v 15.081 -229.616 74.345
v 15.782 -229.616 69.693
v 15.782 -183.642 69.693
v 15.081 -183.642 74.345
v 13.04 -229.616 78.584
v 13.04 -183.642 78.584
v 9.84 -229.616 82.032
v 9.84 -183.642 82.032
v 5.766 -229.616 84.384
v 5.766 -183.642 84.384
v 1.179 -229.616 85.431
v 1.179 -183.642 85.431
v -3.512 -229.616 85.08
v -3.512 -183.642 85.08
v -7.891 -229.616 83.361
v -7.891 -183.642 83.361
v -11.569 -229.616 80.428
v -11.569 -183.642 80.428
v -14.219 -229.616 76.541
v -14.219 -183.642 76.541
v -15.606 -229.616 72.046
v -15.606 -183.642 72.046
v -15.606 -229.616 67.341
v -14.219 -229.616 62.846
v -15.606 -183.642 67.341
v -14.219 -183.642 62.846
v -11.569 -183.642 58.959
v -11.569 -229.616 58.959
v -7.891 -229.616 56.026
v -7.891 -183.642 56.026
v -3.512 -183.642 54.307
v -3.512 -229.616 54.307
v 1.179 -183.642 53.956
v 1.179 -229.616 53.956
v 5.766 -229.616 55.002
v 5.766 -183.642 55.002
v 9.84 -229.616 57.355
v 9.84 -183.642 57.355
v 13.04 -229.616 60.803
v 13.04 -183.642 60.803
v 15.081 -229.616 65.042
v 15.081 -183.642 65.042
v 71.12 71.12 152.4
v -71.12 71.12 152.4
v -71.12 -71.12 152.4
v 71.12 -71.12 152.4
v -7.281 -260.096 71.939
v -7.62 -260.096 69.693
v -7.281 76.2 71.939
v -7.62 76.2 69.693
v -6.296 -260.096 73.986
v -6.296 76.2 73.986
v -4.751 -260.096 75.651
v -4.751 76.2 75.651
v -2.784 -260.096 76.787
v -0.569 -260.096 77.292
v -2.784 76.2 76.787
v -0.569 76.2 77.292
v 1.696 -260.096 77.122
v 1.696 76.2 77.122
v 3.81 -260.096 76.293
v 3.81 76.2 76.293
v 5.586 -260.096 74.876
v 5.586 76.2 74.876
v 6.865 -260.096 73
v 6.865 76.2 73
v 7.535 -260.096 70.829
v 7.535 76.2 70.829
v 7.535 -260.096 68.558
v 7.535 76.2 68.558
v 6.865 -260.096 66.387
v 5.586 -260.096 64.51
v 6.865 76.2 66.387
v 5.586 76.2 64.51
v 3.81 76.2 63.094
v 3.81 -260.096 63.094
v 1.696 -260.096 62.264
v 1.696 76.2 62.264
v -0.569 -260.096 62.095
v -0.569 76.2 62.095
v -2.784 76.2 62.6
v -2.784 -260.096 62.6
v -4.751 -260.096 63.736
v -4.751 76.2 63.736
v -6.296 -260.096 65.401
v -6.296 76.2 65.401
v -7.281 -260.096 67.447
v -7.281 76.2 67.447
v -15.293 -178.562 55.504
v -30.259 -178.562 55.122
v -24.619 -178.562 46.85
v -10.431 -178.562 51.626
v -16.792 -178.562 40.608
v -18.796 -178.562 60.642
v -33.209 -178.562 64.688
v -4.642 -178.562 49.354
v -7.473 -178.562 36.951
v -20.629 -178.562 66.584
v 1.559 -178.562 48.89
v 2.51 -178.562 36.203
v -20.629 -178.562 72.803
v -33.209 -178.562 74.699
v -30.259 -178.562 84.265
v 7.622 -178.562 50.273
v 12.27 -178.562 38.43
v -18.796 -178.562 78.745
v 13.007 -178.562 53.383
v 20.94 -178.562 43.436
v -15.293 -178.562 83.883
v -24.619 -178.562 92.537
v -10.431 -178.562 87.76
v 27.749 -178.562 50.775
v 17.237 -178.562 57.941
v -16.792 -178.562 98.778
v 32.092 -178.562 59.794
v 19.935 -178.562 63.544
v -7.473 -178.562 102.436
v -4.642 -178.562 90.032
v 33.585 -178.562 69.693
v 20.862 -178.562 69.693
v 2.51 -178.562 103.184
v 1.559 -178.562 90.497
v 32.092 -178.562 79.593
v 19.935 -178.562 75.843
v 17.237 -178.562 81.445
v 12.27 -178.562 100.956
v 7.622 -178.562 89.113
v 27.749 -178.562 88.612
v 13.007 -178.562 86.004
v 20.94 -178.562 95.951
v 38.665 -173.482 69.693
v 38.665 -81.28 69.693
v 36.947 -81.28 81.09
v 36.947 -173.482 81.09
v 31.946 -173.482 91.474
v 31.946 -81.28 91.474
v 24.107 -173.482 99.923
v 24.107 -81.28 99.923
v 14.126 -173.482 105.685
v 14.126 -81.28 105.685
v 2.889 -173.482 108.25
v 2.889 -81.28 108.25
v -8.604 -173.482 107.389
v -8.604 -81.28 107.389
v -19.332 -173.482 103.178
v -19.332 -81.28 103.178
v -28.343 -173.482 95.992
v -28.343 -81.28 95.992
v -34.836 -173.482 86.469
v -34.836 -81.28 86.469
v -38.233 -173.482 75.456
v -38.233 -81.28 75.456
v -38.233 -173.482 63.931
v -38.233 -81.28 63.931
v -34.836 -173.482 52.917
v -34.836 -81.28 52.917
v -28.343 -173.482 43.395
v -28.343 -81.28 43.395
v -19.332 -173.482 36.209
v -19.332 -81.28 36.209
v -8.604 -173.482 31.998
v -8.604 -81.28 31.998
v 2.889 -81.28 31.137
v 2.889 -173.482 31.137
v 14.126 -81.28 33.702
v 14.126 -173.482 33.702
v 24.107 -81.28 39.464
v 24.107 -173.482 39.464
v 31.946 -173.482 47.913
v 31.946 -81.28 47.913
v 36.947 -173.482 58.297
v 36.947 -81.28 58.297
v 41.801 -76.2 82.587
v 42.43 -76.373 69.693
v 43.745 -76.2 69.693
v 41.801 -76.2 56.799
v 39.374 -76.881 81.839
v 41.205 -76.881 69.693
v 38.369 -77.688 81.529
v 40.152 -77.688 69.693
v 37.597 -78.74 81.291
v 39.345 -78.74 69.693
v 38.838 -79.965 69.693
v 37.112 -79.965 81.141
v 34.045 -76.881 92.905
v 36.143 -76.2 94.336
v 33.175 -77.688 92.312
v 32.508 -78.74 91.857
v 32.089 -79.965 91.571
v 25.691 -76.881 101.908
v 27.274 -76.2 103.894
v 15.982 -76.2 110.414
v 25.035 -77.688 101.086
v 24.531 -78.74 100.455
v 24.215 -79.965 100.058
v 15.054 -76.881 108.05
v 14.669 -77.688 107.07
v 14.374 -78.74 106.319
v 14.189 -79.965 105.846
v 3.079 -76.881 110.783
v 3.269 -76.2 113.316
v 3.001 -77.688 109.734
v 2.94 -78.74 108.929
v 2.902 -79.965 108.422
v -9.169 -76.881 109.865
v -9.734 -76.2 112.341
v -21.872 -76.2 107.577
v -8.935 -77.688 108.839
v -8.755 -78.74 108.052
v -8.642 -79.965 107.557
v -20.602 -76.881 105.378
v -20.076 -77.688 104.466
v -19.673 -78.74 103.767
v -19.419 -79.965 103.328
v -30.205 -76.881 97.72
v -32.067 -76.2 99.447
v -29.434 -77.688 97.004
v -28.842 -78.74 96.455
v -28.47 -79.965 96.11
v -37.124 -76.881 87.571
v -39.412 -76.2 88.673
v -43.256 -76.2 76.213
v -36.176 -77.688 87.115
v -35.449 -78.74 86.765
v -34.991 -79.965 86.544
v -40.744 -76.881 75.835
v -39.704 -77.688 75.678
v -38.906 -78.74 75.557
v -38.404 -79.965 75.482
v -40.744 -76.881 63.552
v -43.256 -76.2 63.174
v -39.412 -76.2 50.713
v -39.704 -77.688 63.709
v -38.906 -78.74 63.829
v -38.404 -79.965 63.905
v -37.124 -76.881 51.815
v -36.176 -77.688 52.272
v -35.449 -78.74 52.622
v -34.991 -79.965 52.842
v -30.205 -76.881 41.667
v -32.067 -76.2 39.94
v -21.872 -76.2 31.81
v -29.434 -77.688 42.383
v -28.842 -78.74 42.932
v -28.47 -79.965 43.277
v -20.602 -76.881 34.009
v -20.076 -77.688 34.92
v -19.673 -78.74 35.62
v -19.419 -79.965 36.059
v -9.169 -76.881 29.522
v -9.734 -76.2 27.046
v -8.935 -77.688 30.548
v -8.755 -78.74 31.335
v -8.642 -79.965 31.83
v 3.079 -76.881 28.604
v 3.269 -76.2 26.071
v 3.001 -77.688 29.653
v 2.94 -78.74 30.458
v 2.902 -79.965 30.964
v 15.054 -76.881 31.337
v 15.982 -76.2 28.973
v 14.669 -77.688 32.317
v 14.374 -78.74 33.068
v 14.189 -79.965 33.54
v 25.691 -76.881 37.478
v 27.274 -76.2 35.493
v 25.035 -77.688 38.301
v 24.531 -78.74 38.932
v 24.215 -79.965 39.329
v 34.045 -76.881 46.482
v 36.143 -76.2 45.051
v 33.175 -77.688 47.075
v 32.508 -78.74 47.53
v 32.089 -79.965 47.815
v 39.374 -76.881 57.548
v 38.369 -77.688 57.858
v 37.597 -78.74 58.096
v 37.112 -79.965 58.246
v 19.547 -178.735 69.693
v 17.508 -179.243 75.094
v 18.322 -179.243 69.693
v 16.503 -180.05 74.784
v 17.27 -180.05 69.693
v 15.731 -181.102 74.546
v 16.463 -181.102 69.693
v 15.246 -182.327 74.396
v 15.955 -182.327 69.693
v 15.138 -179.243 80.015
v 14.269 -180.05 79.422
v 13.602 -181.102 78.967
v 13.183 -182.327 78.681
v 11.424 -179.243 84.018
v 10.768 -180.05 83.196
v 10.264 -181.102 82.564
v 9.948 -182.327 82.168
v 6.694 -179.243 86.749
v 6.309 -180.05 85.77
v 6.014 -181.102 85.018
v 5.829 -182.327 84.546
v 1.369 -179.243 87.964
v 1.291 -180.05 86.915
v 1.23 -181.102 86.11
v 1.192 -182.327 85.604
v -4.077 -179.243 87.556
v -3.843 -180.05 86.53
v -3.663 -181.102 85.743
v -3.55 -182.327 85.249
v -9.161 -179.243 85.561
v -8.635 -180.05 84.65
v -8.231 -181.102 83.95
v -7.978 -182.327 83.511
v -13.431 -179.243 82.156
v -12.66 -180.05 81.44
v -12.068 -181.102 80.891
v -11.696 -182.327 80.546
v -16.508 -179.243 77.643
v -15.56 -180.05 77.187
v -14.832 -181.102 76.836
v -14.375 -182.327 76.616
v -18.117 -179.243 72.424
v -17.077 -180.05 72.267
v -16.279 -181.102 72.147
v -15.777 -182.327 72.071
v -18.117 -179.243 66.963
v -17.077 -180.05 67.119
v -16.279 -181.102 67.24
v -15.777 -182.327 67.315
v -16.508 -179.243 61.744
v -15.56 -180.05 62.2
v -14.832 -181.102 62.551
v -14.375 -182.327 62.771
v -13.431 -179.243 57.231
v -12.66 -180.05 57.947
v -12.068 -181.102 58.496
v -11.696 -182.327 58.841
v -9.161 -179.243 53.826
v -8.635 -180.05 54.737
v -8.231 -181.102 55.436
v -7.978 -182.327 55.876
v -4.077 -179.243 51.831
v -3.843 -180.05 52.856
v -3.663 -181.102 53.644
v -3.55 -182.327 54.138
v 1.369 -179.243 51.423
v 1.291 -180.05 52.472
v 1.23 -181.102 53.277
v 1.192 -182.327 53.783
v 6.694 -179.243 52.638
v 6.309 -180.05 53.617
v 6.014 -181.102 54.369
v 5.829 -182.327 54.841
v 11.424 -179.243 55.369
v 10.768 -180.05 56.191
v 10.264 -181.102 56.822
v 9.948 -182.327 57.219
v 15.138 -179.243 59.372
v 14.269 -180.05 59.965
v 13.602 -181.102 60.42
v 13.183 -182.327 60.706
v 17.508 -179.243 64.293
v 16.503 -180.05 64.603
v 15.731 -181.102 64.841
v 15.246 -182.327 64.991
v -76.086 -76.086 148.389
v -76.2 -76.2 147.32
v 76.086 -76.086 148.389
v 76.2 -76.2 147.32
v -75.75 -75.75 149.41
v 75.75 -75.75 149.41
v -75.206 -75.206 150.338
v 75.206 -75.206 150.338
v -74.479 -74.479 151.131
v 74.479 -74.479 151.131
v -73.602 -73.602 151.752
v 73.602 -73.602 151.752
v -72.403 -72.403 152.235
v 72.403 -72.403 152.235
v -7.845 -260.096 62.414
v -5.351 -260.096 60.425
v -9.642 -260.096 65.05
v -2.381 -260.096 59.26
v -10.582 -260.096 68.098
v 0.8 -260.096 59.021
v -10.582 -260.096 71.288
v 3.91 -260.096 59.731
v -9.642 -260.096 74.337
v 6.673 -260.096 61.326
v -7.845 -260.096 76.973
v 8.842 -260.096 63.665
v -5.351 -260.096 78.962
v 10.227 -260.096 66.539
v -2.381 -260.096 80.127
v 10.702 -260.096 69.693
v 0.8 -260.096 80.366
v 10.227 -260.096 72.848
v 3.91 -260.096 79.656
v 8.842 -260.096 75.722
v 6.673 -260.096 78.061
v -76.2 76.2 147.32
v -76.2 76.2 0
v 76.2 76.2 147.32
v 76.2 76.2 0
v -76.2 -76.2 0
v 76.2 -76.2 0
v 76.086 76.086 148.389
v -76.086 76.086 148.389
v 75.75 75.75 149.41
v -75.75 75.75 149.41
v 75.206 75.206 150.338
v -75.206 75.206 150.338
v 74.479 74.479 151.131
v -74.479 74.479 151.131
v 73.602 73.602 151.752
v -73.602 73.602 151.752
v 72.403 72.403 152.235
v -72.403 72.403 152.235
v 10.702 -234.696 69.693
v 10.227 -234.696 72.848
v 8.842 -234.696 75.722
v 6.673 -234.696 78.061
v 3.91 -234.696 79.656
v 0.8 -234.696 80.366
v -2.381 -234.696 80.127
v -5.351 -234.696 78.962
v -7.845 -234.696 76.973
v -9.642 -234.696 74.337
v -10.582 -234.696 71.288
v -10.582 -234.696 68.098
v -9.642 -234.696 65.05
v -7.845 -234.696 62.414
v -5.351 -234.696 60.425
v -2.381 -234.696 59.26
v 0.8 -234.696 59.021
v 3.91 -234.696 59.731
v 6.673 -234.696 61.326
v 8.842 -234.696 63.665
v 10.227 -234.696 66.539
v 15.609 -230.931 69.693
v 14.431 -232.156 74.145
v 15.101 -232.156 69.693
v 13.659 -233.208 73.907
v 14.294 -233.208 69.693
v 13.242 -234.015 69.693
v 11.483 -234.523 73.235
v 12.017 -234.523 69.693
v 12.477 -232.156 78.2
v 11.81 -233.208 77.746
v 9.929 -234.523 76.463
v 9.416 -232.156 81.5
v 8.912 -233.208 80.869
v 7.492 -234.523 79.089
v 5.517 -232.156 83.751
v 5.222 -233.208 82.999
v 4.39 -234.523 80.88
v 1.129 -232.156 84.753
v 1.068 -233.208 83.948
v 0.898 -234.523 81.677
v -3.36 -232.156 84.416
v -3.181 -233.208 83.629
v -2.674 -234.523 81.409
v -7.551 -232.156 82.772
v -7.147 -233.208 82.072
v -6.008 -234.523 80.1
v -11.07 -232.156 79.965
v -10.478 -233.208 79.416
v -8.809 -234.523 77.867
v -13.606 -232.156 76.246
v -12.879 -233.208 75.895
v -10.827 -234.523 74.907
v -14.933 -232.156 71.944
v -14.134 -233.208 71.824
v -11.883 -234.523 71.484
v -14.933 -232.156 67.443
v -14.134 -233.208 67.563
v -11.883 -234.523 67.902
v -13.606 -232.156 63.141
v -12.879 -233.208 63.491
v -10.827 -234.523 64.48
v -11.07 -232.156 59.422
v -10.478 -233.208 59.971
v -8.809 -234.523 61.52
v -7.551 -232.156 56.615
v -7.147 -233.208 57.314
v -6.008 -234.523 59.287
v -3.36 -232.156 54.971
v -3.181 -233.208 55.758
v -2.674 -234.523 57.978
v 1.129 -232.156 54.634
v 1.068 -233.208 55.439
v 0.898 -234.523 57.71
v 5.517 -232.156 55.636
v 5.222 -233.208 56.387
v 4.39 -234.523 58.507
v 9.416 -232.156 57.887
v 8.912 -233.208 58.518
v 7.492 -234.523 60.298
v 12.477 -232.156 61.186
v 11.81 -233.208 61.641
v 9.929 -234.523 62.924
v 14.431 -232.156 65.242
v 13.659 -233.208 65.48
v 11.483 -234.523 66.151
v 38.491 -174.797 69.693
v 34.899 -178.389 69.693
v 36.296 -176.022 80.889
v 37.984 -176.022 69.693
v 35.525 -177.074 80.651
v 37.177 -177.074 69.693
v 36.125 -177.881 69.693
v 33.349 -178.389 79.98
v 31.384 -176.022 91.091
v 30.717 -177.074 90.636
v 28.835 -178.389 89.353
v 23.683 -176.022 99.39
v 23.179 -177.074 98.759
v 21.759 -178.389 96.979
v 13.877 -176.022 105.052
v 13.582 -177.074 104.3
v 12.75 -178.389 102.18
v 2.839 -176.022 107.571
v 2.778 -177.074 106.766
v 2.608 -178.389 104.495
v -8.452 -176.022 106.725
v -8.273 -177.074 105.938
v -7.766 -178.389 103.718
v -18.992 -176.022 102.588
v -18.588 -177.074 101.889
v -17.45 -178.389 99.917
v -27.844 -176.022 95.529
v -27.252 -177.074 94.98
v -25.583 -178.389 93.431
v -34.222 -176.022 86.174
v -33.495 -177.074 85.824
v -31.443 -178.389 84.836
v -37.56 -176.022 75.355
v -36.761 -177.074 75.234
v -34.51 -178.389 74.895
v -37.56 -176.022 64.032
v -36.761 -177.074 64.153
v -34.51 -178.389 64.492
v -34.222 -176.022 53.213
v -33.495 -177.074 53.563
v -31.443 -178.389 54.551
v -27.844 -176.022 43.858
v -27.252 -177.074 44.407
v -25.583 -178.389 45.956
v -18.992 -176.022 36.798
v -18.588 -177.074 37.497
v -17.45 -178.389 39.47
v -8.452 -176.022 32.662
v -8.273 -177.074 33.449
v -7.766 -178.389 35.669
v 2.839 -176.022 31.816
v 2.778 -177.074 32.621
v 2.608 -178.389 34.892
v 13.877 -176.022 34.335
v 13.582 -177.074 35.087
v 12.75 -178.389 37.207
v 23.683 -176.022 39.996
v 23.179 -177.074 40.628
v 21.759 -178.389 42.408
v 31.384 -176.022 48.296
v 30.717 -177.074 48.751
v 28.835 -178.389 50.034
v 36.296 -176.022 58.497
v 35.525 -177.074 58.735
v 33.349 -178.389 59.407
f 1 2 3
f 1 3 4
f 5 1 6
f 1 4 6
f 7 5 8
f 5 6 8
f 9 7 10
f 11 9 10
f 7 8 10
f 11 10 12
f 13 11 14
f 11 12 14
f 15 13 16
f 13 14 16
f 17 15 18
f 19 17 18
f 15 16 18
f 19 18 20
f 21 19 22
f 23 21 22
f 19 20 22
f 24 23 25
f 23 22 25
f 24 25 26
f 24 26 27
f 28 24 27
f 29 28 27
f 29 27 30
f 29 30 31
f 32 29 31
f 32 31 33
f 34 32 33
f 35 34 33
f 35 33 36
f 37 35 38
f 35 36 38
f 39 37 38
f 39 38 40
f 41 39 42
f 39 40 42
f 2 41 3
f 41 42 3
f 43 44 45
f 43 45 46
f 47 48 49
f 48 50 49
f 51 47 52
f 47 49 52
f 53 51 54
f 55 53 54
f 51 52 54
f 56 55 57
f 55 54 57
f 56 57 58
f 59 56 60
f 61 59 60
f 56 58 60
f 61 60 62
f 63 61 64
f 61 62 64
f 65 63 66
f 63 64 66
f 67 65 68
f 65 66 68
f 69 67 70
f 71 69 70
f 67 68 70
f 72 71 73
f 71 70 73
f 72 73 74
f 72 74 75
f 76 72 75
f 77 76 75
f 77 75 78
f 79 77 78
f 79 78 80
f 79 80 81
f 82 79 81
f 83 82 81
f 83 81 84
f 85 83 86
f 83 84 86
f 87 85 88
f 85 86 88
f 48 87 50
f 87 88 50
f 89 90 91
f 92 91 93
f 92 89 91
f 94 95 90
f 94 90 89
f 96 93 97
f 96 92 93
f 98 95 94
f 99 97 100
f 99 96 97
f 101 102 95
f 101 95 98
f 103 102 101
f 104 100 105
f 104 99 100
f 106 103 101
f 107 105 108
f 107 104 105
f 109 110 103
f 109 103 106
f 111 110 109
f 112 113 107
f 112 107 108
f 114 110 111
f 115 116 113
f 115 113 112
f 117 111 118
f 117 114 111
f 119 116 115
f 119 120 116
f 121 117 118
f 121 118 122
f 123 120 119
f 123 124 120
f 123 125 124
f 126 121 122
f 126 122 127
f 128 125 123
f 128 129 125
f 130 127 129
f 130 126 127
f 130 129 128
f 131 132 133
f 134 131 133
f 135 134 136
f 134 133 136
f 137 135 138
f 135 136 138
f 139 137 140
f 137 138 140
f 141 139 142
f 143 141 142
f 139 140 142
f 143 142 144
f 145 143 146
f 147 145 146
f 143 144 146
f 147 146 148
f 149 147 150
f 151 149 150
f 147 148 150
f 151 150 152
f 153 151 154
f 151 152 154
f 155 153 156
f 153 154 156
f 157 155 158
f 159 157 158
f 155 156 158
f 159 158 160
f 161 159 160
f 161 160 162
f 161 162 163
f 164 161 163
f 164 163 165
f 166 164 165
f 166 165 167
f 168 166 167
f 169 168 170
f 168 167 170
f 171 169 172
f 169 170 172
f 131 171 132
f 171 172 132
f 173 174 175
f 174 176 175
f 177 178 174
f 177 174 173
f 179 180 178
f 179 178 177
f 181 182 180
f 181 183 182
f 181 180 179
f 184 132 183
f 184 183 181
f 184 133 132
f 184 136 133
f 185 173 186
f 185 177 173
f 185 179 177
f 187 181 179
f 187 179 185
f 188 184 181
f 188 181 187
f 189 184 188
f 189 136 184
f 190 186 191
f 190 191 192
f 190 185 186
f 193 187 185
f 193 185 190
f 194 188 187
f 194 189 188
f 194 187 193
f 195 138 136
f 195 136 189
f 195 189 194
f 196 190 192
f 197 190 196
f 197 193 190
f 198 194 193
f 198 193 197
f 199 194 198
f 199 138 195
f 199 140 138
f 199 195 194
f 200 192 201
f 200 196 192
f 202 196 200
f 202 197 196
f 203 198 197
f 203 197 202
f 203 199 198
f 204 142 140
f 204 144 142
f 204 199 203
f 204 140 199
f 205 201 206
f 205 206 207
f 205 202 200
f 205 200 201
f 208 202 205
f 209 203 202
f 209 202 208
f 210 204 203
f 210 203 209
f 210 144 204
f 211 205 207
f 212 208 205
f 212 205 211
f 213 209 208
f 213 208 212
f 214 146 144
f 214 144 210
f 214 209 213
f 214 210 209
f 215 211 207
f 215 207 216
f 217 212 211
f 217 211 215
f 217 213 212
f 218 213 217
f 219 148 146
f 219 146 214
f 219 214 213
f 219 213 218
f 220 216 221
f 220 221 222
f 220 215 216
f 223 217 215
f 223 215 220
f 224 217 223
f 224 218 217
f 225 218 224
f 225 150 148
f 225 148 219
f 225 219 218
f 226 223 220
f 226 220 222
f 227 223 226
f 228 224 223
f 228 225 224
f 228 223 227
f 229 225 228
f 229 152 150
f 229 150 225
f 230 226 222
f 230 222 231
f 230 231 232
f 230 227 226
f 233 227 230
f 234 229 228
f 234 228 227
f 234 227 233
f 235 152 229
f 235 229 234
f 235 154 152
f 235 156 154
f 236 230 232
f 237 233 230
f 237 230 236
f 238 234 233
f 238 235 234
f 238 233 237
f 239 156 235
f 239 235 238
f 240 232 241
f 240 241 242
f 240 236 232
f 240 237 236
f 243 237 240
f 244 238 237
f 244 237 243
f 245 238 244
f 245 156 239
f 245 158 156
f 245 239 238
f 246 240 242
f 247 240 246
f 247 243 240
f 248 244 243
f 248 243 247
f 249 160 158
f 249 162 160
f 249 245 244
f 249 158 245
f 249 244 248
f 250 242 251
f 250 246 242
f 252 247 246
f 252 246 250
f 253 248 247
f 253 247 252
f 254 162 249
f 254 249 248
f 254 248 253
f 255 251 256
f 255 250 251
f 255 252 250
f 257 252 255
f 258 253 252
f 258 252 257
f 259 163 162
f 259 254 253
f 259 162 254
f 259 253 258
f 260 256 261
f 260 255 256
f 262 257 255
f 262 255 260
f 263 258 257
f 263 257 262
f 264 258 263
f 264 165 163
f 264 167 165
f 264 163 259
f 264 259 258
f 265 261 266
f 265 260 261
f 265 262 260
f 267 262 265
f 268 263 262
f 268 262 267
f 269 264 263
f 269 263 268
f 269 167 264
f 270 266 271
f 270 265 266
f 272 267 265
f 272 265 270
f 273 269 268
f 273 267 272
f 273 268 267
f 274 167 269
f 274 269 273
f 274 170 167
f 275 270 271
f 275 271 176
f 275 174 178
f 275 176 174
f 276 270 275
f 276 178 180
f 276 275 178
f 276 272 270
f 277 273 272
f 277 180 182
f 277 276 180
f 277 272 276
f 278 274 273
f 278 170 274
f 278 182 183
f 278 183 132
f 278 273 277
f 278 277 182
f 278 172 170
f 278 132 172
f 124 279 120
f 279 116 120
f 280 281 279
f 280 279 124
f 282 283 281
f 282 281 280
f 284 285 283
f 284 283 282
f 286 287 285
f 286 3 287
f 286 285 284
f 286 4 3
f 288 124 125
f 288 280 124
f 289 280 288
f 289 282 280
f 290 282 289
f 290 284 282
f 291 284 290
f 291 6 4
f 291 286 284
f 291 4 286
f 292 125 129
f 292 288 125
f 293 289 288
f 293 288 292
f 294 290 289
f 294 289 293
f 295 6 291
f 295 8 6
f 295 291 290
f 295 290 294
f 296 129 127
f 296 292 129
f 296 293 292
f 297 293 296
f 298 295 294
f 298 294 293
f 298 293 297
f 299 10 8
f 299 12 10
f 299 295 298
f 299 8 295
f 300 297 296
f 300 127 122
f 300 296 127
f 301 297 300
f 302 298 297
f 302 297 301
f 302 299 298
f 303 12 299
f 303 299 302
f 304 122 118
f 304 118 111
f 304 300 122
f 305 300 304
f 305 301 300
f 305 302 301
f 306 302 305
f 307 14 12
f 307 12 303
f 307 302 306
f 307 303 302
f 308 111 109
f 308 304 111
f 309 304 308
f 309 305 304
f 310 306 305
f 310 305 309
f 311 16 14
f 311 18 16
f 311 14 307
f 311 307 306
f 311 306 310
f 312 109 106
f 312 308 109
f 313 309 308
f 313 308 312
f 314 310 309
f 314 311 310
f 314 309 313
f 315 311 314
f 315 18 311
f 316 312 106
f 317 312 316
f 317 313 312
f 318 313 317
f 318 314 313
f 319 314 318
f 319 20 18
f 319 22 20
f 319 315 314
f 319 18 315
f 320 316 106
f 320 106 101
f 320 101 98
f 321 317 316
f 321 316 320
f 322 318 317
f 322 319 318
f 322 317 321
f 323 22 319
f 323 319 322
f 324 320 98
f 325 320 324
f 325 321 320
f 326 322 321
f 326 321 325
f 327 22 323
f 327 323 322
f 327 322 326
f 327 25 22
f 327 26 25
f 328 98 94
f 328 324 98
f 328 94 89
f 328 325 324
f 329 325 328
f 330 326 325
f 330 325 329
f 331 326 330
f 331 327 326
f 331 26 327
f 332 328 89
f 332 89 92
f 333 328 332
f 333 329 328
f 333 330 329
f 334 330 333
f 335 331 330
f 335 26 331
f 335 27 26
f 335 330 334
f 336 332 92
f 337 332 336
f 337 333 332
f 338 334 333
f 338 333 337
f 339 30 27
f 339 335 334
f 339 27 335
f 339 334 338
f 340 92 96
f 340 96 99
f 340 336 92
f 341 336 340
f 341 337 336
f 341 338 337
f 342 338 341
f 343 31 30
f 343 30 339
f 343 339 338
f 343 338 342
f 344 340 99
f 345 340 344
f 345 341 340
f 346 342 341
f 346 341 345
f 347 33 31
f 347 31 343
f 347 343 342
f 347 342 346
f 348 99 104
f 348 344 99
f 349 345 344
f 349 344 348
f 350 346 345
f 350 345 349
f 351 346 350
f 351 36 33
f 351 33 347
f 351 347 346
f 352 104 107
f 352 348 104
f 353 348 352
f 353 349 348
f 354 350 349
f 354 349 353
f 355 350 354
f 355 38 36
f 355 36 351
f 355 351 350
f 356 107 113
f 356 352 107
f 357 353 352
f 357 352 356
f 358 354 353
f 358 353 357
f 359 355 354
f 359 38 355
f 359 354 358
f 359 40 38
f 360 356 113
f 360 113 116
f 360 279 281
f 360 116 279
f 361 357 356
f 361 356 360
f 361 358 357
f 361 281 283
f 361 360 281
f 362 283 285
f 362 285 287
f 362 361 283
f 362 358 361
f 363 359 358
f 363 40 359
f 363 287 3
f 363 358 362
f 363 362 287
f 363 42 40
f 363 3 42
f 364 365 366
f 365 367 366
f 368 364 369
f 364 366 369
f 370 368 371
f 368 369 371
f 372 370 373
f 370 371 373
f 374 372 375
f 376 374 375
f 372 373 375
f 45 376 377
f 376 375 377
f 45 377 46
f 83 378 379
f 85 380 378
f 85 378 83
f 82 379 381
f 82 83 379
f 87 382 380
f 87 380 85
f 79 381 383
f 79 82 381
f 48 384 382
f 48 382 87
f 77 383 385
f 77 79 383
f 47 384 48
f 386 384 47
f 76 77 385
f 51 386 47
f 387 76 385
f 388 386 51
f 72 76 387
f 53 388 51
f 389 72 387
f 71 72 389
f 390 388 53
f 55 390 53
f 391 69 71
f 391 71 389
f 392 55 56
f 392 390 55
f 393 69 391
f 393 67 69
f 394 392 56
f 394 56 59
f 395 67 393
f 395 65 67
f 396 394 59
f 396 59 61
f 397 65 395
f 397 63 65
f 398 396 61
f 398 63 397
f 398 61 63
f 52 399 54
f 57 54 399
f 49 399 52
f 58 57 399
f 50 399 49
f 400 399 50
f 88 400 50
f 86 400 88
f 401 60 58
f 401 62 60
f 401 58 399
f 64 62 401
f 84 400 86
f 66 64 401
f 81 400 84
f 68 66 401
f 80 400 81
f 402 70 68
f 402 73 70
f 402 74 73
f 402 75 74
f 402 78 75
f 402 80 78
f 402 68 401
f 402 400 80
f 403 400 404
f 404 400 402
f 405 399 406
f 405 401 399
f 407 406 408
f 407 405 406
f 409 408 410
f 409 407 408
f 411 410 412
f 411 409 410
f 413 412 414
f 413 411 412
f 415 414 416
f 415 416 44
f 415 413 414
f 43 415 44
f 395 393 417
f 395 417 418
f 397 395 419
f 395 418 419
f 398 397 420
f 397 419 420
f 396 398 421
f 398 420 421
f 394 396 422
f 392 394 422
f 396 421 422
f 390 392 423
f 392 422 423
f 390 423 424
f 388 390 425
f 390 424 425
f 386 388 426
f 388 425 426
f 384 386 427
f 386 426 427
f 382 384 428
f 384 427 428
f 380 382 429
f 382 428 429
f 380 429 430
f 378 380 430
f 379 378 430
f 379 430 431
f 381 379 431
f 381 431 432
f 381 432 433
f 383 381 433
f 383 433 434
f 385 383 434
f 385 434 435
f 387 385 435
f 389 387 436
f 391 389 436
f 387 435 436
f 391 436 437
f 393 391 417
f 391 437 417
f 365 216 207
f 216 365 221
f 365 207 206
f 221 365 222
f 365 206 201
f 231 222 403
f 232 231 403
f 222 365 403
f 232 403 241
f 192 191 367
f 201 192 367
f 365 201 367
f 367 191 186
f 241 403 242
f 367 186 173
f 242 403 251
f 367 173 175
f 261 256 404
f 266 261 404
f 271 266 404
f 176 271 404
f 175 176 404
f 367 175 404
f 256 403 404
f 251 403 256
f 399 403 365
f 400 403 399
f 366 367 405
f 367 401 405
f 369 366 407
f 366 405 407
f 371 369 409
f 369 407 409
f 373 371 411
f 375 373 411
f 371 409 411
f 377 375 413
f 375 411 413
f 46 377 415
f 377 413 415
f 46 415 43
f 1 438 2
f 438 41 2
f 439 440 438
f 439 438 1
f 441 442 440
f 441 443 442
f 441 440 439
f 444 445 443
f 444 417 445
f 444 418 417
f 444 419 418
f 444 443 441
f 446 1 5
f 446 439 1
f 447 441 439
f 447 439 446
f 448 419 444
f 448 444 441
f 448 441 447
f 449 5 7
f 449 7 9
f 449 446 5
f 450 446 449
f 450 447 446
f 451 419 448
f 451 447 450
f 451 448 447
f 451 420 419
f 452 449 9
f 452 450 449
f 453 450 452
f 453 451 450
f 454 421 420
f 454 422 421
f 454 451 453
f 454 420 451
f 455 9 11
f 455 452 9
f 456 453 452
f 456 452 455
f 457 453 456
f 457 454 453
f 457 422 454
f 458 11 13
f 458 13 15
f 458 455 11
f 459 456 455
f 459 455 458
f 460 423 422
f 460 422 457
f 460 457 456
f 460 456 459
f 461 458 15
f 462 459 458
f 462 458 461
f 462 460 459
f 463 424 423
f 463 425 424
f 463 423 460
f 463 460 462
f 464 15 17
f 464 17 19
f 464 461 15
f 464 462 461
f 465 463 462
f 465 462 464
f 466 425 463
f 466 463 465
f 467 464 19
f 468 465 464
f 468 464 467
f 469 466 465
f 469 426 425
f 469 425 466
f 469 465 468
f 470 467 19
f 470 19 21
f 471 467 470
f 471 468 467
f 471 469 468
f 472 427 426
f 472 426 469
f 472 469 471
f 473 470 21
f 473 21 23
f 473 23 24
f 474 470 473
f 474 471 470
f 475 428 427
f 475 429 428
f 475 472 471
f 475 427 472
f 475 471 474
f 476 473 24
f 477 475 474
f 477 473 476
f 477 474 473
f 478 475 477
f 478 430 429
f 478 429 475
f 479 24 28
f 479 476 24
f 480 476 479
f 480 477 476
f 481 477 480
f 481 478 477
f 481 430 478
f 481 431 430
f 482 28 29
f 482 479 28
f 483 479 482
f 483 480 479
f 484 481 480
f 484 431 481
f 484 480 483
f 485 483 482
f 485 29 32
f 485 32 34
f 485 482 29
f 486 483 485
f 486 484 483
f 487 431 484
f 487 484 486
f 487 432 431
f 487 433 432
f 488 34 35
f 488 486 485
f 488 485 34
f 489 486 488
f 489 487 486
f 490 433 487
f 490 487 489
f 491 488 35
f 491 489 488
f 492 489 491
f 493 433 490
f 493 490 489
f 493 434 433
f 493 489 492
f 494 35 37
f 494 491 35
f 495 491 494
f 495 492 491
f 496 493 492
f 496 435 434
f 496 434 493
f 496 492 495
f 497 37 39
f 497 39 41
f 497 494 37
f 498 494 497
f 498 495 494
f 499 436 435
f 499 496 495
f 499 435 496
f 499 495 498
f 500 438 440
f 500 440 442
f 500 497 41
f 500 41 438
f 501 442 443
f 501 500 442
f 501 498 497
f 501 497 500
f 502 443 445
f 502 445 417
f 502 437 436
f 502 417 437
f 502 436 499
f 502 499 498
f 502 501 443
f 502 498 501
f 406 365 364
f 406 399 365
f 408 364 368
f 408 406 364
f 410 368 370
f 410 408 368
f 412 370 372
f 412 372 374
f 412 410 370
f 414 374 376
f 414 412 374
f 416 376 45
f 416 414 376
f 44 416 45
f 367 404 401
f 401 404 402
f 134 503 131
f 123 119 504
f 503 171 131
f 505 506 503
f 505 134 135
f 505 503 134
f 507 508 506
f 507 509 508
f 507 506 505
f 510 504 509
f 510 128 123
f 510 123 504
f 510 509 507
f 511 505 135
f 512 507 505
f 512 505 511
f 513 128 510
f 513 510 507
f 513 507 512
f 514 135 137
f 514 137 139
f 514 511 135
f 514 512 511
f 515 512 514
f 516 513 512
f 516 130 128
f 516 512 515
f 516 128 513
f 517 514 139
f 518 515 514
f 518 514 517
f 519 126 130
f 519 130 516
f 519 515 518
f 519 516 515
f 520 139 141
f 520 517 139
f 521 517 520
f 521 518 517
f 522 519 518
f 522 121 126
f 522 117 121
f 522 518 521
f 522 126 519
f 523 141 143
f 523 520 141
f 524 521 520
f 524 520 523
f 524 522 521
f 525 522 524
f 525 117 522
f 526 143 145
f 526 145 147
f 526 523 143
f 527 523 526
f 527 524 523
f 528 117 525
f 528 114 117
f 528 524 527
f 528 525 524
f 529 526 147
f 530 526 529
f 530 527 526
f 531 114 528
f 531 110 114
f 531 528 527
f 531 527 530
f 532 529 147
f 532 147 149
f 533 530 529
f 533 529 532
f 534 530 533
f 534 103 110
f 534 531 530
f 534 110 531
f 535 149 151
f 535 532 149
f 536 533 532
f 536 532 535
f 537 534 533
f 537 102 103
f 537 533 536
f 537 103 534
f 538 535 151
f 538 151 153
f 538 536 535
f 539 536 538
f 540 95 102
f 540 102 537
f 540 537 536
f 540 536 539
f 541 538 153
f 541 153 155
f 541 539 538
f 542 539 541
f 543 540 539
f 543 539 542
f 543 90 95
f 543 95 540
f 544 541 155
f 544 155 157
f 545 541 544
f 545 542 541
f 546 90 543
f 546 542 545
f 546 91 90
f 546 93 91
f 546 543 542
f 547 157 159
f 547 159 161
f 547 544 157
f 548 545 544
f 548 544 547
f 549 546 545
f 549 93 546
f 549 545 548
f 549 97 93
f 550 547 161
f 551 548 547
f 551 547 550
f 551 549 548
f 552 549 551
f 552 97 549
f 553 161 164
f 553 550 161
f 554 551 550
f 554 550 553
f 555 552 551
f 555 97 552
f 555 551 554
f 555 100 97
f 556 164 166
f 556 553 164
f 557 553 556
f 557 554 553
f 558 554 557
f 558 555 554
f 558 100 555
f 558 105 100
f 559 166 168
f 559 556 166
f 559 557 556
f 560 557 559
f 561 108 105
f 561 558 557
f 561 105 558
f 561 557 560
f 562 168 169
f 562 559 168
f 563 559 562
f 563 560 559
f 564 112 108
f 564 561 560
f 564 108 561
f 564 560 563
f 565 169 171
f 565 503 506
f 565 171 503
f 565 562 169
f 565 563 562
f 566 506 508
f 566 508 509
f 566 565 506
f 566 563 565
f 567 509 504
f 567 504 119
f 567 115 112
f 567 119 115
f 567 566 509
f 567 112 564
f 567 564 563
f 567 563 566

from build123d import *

# Parameters (mm, degrees)
F0_W      = 152.4
F0_H      = 152.4
F1_DEPTH  = 152.4
F2_R      = 5.08
F3_R      = 38.6645331573
F4_DEPTH  = 102.362
F5_R      = 15.7820289437
F6_DEPTH  = 56.134
F7_R      = 5.08
F9_D      = 15.24
F10_DEPTH = 25.4


with BuildPart() as f1:
    # F0 (on Top) → F1 (new body)
    with BuildSketch(Plane.XY):
        Rectangle(F0_W, F0_H)
    extrude(amount=F1_DEPTH)

    # F2
    f2_edges = [f1.edges().sort_by_distance(p)[0] for p in [
        (76.2, 0, 152.4),
        (0, 76.2, 152.4),
        (-76.2, 0, 152.4),
        (0, -76.2, 152.4),
    ]]
    fillet(f2_edges, radius=F2_R)

    # F3 (on face) → F4 (join)
    with BuildSketch(Plane.XZ.offset(76.2)):
        with Locations((0, 69.6934089065)):
            Circle(F3_R)
    extrude(amount=F4_DEPTH)

    # F5 (on face) → F6 (join)
    with BuildSketch(Plane.XZ.offset(178.562)):
        with Locations((0, 69.6934089065)):
            Circle(F5_R)
    extrude(amount=F6_DEPTH)

    # F7
    f7_edges = [f1.edges().sort_by_distance(p)[0] for p in [
        (-15.782029, -234.696, 69.693409),
        (-15.782029, -178.562, 69.693409),
        (-38.664533, -178.562, 69.693409),
        (-38.664533, -76.2, 69.693409),
    ]]
    fillet(f7_edges, radius=F7_R)

    # F9 (through all)
    with Locations(Plane.XZ.offset(234.696)):
        with Locations((0, 69.6934089065)):
            Hole(F9_D / 2)

    # F10 (add): a face of the model
    f10_faces = [f1.faces().sort_by_distance(p)[0] for p in [
        (-10.3993298541, -234.696, 69.6934089065),
    ]]
    extrude(f10_faces, amount=F10_DEPTH)


solid = f1.part
